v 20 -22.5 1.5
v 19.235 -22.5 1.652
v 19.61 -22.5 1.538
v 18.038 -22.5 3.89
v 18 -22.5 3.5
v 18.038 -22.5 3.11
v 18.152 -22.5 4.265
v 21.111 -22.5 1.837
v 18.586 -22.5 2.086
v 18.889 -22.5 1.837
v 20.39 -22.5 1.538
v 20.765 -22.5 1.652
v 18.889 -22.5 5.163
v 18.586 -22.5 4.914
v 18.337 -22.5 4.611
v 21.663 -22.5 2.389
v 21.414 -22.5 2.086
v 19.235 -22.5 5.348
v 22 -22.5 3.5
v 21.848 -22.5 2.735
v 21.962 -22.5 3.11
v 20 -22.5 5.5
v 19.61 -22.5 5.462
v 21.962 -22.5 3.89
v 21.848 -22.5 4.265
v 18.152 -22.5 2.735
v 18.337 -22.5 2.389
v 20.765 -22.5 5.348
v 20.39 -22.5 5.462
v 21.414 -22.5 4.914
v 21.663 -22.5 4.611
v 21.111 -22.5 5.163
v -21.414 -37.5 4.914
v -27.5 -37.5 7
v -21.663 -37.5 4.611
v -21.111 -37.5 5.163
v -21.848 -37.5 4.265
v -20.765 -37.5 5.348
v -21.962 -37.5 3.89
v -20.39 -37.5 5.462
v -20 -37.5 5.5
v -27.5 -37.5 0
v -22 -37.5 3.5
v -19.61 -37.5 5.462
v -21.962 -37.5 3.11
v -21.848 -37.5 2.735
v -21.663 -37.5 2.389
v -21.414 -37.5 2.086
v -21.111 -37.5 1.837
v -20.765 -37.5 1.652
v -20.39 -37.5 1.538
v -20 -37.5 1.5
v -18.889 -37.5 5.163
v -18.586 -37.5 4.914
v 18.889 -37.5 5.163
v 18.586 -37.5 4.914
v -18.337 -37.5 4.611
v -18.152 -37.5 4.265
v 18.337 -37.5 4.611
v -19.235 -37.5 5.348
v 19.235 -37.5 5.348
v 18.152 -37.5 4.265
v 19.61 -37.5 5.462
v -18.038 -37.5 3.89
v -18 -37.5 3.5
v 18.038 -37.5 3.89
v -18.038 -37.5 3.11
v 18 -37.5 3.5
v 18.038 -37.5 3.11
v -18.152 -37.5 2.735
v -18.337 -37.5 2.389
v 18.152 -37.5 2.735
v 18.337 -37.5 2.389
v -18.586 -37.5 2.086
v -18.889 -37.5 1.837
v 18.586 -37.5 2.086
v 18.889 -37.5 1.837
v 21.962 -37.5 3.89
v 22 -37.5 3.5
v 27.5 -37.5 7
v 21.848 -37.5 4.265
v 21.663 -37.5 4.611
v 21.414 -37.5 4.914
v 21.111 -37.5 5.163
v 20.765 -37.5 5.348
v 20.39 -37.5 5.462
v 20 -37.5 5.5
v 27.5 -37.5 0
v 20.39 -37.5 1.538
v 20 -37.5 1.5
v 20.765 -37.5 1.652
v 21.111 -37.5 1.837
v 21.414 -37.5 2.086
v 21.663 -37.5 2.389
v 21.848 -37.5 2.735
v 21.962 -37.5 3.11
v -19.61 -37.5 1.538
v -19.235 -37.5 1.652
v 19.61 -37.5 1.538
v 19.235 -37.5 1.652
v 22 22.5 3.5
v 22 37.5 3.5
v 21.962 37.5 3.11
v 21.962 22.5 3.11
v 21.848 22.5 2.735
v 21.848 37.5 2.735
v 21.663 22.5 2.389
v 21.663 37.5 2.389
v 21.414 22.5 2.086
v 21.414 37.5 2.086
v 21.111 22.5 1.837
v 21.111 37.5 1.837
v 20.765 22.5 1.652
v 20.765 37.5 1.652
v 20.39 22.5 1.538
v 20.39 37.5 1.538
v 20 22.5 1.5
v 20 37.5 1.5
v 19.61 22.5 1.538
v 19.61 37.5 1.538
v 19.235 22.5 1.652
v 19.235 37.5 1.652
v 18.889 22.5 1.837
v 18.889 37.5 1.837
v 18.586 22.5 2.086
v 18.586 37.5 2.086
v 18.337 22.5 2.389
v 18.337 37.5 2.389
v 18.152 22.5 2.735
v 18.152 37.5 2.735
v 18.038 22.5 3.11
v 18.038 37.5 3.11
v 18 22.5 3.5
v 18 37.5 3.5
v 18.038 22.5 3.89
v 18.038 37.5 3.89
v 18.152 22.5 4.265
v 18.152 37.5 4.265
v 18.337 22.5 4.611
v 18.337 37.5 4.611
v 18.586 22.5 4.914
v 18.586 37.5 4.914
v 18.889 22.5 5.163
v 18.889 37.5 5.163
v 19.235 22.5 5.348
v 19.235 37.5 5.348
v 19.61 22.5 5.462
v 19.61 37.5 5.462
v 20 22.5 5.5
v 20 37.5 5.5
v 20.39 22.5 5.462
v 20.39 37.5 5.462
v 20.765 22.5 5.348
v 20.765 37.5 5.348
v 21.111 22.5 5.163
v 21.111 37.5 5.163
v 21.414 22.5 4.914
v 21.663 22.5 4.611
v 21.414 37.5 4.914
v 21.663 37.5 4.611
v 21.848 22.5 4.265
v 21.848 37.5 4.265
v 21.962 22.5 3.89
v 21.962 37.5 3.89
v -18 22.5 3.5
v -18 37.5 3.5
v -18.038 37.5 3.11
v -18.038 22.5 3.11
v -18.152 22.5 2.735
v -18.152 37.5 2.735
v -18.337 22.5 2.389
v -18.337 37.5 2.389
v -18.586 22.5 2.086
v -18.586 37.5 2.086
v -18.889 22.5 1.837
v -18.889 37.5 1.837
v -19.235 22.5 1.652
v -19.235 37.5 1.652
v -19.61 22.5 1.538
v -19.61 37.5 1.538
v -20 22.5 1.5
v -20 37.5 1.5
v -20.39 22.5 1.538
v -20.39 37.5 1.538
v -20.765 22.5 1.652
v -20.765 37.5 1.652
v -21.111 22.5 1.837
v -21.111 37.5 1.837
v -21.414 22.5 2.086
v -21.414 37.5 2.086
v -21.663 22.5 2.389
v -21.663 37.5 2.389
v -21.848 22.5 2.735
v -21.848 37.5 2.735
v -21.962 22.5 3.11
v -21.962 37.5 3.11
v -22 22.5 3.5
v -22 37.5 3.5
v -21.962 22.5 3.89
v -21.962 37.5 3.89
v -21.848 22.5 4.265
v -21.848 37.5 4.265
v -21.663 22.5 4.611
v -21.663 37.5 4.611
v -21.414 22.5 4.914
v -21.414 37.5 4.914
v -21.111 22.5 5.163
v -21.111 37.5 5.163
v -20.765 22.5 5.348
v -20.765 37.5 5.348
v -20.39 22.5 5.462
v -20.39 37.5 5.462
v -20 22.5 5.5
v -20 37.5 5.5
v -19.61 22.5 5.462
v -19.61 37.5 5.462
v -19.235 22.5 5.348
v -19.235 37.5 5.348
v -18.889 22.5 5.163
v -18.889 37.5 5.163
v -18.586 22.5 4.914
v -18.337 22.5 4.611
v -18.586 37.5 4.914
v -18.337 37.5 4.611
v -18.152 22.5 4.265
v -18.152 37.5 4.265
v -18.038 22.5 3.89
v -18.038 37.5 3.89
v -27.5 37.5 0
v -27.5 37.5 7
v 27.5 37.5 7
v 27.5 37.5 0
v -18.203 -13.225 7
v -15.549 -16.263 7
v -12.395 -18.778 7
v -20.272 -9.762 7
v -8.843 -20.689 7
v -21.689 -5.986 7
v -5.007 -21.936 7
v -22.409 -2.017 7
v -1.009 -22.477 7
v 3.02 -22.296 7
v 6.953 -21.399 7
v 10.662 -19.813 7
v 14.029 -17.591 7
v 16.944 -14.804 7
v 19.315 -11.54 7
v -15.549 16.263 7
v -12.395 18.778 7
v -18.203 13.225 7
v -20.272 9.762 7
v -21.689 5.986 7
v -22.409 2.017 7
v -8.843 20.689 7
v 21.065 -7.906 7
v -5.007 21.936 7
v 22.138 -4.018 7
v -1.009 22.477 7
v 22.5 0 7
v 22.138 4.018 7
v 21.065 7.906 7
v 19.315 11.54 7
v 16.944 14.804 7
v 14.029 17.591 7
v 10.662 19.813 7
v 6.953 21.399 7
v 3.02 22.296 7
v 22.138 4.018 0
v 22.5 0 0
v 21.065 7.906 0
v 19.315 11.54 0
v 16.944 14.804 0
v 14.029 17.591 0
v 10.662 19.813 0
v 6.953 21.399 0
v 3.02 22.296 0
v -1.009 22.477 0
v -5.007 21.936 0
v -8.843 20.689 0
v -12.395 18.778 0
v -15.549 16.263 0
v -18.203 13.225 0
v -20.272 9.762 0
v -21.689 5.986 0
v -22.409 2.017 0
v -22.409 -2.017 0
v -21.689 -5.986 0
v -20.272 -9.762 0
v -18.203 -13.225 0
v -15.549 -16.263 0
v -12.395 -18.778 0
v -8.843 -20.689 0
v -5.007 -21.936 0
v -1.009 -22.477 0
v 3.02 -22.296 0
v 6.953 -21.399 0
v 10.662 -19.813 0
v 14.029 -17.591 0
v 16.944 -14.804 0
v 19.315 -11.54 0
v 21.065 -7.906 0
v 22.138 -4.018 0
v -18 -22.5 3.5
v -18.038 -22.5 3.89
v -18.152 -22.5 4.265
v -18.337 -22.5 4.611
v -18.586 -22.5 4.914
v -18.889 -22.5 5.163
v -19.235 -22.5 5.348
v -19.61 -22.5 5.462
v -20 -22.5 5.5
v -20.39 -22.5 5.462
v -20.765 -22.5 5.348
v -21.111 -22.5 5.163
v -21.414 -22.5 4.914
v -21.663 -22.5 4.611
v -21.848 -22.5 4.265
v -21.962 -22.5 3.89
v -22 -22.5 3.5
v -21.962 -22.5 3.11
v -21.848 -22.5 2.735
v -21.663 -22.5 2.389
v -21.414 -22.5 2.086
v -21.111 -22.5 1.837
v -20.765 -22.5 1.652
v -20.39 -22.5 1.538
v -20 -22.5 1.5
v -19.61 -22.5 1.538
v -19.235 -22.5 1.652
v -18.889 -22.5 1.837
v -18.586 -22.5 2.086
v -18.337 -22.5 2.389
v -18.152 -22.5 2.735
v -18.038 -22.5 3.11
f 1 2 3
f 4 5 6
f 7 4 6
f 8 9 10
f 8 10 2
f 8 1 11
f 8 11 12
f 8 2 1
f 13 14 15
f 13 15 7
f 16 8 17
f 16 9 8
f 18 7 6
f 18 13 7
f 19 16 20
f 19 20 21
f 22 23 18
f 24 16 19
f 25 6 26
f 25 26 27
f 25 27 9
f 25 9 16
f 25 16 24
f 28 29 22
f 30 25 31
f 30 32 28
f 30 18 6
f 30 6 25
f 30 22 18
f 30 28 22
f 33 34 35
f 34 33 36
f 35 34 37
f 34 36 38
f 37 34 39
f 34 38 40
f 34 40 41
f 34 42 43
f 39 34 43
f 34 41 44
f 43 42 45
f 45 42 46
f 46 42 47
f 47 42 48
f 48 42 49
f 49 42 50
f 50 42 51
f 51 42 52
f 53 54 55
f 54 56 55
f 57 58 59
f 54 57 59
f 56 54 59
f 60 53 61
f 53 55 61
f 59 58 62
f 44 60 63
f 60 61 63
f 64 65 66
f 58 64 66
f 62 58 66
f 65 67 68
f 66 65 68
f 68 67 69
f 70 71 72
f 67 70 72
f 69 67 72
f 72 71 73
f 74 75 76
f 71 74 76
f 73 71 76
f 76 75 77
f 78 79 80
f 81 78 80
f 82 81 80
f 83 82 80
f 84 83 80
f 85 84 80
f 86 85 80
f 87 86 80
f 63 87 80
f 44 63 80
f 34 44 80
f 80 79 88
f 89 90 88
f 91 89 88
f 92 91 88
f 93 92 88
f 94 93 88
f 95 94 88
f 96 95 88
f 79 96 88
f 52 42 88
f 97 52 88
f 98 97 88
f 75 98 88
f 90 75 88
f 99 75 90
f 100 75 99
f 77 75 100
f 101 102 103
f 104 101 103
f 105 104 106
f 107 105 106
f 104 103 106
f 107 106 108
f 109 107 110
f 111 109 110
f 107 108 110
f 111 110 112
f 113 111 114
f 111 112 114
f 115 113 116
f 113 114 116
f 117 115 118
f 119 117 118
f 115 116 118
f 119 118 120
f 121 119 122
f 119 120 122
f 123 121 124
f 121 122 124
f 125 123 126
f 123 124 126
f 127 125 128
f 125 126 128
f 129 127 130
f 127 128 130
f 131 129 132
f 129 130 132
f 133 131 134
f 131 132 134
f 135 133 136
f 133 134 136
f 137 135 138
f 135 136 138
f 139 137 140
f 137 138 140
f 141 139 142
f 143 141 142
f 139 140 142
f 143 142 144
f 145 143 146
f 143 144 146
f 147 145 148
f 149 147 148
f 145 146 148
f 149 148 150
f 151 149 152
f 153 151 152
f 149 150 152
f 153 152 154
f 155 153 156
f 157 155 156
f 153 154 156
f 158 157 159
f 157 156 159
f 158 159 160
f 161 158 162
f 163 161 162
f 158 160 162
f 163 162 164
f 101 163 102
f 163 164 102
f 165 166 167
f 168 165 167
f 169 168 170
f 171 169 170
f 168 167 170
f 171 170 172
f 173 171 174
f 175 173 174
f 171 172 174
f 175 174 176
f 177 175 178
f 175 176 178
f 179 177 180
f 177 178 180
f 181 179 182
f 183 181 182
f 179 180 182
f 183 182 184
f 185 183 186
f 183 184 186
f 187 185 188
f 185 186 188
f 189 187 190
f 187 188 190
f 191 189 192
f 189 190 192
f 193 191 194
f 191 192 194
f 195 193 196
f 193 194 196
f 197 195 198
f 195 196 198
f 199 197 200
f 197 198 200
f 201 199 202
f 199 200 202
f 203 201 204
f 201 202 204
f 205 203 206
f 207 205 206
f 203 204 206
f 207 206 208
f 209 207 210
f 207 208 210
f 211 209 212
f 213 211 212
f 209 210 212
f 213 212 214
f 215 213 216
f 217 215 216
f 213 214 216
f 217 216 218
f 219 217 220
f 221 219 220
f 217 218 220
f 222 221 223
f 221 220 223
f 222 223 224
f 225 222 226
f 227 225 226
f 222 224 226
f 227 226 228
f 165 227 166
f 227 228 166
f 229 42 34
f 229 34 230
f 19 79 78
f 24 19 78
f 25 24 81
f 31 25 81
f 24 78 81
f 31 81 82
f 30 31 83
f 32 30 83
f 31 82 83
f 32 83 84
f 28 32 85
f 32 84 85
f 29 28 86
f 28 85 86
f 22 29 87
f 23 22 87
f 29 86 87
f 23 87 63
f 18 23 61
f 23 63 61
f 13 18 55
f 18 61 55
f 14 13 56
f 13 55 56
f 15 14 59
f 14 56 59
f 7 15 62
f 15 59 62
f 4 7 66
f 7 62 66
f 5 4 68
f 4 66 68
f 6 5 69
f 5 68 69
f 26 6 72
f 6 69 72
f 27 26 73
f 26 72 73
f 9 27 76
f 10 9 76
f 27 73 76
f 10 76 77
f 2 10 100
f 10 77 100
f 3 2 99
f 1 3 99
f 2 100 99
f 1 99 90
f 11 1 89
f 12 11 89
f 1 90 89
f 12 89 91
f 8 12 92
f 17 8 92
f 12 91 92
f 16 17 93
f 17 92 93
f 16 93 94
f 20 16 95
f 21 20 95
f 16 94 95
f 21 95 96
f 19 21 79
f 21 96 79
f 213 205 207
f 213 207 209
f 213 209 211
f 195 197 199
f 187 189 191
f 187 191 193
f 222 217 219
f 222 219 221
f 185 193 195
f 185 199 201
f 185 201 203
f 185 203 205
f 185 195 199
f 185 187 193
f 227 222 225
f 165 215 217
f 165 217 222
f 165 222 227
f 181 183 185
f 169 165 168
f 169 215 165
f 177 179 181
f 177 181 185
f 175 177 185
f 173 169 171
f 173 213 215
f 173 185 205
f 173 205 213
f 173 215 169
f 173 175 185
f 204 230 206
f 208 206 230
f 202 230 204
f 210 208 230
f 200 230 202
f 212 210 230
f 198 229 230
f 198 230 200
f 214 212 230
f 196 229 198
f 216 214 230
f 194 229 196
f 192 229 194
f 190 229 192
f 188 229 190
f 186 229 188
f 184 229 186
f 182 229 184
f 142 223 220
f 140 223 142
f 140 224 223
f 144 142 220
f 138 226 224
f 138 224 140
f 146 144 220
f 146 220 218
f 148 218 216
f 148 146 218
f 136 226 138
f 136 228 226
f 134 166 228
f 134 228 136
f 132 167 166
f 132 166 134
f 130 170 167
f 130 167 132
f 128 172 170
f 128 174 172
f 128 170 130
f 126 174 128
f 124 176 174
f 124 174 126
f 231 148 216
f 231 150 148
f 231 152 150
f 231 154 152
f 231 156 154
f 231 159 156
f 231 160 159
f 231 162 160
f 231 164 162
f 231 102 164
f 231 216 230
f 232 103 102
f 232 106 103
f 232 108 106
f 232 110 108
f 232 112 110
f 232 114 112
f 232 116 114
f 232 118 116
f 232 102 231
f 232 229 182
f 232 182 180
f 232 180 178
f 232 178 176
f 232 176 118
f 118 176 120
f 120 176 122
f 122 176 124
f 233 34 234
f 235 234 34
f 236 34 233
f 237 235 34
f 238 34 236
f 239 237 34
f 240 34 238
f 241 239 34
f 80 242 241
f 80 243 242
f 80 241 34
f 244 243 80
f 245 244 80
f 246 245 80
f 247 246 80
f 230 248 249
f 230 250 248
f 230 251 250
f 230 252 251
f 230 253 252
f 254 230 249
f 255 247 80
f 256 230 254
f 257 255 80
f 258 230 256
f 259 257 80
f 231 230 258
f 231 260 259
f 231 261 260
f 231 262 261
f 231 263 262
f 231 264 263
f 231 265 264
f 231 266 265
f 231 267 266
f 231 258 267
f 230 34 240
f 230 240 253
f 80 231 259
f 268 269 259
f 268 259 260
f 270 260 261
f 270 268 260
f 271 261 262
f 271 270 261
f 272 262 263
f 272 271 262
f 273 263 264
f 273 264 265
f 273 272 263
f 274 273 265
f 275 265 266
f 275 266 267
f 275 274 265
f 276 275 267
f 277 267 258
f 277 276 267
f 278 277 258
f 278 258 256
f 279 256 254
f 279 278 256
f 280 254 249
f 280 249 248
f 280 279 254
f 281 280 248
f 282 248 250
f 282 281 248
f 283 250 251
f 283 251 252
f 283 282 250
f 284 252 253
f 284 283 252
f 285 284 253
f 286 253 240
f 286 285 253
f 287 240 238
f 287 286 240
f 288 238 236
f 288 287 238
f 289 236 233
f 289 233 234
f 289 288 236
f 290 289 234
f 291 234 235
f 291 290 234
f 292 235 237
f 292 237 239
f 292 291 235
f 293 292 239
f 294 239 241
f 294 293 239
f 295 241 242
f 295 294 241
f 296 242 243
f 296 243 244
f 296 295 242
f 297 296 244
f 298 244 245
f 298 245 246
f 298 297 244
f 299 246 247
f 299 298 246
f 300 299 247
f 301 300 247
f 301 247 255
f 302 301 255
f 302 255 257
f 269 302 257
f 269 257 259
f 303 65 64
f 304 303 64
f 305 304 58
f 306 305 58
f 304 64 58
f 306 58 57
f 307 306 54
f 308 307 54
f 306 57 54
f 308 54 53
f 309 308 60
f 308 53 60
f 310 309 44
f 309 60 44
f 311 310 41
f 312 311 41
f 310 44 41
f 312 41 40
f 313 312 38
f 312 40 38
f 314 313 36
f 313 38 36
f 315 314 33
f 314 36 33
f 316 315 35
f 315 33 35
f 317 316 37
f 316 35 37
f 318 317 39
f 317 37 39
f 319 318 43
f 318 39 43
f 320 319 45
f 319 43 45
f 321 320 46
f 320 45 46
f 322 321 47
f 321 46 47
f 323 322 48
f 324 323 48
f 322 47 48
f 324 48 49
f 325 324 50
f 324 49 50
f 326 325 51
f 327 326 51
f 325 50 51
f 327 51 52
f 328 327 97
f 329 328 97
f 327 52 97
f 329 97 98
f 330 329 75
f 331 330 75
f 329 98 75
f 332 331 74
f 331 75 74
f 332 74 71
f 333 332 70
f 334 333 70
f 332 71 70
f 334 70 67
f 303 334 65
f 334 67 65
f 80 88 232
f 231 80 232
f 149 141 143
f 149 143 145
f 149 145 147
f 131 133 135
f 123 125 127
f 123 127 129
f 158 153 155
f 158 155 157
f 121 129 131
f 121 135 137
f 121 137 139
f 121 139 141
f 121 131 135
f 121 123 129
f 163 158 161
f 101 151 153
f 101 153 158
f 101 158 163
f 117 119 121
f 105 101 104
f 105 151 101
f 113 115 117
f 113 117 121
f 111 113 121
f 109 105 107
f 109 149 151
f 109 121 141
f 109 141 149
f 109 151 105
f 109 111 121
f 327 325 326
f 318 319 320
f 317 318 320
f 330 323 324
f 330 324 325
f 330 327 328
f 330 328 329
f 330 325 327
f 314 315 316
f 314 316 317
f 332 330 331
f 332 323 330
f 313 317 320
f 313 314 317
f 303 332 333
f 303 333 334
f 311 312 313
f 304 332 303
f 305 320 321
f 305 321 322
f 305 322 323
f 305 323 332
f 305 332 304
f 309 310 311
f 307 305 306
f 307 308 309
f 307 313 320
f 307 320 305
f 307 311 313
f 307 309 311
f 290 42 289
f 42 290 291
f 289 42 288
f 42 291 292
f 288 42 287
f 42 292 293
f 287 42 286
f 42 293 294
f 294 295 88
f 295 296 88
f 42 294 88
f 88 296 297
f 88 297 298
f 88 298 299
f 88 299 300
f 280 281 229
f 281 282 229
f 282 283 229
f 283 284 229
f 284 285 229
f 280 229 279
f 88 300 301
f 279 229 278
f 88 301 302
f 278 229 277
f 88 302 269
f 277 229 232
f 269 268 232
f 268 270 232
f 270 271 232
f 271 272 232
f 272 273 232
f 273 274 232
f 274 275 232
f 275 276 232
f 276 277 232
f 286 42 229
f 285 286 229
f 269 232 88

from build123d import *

# Parameters (mm, degrees)
SKETCH1_W           = 55
SKETCH1_H           = 75
SKETCH1_R           = 22.5
BOSS_EXTRUDE1_DEPTH = 7
SKETCH2_R           = 2
CUT_EXTRUDE1_DEPTH  = 15
SKETCH3_R           = 2
CUT_EXTRUDE2_DEPTH  = 15


with BuildPart() as part:
    # Sketch1 → Boss-Extrude1 (new body)
    with BuildSketch(Plane.XY):
        Rectangle(SKETCH1_W, SKETCH1_H)
        Circle(SKETCH1_R, mode=Mode.SUBTRACT)
    extrude(amount=BOSS_EXTRUDE1_DEPTH)

    # Sketch2 → Cut-Extrude1 (cut)
    with BuildSketch(Plane(origin=(0, 37.5, 0), x_dir=(1, 0, 0), z_dir=(0, 1, 0))):
        with Locations((-20, -3.5)):
            Circle(SKETCH2_R)
        with Locations((20, -3.5)):
            Circle(SKETCH2_R)
    extrude(amount=-CUT_EXTRUDE1_DEPTH, mode=Mode.SUBTRACT)

    # Sketch3 → Cut-Extrude2 (cut)
    with BuildSketch(Plane.XZ.offset(37.5)):
        with Locations((-20, 3.5)):
            Circle(SKETCH3_R)
        with Locations((20, 3.5)):
            Circle(SKETCH3_R)
    extrude(amount=-CUT_EXTRUDE2_DEPTH, mode=Mode.SUBTRACT)


solid = part.part
